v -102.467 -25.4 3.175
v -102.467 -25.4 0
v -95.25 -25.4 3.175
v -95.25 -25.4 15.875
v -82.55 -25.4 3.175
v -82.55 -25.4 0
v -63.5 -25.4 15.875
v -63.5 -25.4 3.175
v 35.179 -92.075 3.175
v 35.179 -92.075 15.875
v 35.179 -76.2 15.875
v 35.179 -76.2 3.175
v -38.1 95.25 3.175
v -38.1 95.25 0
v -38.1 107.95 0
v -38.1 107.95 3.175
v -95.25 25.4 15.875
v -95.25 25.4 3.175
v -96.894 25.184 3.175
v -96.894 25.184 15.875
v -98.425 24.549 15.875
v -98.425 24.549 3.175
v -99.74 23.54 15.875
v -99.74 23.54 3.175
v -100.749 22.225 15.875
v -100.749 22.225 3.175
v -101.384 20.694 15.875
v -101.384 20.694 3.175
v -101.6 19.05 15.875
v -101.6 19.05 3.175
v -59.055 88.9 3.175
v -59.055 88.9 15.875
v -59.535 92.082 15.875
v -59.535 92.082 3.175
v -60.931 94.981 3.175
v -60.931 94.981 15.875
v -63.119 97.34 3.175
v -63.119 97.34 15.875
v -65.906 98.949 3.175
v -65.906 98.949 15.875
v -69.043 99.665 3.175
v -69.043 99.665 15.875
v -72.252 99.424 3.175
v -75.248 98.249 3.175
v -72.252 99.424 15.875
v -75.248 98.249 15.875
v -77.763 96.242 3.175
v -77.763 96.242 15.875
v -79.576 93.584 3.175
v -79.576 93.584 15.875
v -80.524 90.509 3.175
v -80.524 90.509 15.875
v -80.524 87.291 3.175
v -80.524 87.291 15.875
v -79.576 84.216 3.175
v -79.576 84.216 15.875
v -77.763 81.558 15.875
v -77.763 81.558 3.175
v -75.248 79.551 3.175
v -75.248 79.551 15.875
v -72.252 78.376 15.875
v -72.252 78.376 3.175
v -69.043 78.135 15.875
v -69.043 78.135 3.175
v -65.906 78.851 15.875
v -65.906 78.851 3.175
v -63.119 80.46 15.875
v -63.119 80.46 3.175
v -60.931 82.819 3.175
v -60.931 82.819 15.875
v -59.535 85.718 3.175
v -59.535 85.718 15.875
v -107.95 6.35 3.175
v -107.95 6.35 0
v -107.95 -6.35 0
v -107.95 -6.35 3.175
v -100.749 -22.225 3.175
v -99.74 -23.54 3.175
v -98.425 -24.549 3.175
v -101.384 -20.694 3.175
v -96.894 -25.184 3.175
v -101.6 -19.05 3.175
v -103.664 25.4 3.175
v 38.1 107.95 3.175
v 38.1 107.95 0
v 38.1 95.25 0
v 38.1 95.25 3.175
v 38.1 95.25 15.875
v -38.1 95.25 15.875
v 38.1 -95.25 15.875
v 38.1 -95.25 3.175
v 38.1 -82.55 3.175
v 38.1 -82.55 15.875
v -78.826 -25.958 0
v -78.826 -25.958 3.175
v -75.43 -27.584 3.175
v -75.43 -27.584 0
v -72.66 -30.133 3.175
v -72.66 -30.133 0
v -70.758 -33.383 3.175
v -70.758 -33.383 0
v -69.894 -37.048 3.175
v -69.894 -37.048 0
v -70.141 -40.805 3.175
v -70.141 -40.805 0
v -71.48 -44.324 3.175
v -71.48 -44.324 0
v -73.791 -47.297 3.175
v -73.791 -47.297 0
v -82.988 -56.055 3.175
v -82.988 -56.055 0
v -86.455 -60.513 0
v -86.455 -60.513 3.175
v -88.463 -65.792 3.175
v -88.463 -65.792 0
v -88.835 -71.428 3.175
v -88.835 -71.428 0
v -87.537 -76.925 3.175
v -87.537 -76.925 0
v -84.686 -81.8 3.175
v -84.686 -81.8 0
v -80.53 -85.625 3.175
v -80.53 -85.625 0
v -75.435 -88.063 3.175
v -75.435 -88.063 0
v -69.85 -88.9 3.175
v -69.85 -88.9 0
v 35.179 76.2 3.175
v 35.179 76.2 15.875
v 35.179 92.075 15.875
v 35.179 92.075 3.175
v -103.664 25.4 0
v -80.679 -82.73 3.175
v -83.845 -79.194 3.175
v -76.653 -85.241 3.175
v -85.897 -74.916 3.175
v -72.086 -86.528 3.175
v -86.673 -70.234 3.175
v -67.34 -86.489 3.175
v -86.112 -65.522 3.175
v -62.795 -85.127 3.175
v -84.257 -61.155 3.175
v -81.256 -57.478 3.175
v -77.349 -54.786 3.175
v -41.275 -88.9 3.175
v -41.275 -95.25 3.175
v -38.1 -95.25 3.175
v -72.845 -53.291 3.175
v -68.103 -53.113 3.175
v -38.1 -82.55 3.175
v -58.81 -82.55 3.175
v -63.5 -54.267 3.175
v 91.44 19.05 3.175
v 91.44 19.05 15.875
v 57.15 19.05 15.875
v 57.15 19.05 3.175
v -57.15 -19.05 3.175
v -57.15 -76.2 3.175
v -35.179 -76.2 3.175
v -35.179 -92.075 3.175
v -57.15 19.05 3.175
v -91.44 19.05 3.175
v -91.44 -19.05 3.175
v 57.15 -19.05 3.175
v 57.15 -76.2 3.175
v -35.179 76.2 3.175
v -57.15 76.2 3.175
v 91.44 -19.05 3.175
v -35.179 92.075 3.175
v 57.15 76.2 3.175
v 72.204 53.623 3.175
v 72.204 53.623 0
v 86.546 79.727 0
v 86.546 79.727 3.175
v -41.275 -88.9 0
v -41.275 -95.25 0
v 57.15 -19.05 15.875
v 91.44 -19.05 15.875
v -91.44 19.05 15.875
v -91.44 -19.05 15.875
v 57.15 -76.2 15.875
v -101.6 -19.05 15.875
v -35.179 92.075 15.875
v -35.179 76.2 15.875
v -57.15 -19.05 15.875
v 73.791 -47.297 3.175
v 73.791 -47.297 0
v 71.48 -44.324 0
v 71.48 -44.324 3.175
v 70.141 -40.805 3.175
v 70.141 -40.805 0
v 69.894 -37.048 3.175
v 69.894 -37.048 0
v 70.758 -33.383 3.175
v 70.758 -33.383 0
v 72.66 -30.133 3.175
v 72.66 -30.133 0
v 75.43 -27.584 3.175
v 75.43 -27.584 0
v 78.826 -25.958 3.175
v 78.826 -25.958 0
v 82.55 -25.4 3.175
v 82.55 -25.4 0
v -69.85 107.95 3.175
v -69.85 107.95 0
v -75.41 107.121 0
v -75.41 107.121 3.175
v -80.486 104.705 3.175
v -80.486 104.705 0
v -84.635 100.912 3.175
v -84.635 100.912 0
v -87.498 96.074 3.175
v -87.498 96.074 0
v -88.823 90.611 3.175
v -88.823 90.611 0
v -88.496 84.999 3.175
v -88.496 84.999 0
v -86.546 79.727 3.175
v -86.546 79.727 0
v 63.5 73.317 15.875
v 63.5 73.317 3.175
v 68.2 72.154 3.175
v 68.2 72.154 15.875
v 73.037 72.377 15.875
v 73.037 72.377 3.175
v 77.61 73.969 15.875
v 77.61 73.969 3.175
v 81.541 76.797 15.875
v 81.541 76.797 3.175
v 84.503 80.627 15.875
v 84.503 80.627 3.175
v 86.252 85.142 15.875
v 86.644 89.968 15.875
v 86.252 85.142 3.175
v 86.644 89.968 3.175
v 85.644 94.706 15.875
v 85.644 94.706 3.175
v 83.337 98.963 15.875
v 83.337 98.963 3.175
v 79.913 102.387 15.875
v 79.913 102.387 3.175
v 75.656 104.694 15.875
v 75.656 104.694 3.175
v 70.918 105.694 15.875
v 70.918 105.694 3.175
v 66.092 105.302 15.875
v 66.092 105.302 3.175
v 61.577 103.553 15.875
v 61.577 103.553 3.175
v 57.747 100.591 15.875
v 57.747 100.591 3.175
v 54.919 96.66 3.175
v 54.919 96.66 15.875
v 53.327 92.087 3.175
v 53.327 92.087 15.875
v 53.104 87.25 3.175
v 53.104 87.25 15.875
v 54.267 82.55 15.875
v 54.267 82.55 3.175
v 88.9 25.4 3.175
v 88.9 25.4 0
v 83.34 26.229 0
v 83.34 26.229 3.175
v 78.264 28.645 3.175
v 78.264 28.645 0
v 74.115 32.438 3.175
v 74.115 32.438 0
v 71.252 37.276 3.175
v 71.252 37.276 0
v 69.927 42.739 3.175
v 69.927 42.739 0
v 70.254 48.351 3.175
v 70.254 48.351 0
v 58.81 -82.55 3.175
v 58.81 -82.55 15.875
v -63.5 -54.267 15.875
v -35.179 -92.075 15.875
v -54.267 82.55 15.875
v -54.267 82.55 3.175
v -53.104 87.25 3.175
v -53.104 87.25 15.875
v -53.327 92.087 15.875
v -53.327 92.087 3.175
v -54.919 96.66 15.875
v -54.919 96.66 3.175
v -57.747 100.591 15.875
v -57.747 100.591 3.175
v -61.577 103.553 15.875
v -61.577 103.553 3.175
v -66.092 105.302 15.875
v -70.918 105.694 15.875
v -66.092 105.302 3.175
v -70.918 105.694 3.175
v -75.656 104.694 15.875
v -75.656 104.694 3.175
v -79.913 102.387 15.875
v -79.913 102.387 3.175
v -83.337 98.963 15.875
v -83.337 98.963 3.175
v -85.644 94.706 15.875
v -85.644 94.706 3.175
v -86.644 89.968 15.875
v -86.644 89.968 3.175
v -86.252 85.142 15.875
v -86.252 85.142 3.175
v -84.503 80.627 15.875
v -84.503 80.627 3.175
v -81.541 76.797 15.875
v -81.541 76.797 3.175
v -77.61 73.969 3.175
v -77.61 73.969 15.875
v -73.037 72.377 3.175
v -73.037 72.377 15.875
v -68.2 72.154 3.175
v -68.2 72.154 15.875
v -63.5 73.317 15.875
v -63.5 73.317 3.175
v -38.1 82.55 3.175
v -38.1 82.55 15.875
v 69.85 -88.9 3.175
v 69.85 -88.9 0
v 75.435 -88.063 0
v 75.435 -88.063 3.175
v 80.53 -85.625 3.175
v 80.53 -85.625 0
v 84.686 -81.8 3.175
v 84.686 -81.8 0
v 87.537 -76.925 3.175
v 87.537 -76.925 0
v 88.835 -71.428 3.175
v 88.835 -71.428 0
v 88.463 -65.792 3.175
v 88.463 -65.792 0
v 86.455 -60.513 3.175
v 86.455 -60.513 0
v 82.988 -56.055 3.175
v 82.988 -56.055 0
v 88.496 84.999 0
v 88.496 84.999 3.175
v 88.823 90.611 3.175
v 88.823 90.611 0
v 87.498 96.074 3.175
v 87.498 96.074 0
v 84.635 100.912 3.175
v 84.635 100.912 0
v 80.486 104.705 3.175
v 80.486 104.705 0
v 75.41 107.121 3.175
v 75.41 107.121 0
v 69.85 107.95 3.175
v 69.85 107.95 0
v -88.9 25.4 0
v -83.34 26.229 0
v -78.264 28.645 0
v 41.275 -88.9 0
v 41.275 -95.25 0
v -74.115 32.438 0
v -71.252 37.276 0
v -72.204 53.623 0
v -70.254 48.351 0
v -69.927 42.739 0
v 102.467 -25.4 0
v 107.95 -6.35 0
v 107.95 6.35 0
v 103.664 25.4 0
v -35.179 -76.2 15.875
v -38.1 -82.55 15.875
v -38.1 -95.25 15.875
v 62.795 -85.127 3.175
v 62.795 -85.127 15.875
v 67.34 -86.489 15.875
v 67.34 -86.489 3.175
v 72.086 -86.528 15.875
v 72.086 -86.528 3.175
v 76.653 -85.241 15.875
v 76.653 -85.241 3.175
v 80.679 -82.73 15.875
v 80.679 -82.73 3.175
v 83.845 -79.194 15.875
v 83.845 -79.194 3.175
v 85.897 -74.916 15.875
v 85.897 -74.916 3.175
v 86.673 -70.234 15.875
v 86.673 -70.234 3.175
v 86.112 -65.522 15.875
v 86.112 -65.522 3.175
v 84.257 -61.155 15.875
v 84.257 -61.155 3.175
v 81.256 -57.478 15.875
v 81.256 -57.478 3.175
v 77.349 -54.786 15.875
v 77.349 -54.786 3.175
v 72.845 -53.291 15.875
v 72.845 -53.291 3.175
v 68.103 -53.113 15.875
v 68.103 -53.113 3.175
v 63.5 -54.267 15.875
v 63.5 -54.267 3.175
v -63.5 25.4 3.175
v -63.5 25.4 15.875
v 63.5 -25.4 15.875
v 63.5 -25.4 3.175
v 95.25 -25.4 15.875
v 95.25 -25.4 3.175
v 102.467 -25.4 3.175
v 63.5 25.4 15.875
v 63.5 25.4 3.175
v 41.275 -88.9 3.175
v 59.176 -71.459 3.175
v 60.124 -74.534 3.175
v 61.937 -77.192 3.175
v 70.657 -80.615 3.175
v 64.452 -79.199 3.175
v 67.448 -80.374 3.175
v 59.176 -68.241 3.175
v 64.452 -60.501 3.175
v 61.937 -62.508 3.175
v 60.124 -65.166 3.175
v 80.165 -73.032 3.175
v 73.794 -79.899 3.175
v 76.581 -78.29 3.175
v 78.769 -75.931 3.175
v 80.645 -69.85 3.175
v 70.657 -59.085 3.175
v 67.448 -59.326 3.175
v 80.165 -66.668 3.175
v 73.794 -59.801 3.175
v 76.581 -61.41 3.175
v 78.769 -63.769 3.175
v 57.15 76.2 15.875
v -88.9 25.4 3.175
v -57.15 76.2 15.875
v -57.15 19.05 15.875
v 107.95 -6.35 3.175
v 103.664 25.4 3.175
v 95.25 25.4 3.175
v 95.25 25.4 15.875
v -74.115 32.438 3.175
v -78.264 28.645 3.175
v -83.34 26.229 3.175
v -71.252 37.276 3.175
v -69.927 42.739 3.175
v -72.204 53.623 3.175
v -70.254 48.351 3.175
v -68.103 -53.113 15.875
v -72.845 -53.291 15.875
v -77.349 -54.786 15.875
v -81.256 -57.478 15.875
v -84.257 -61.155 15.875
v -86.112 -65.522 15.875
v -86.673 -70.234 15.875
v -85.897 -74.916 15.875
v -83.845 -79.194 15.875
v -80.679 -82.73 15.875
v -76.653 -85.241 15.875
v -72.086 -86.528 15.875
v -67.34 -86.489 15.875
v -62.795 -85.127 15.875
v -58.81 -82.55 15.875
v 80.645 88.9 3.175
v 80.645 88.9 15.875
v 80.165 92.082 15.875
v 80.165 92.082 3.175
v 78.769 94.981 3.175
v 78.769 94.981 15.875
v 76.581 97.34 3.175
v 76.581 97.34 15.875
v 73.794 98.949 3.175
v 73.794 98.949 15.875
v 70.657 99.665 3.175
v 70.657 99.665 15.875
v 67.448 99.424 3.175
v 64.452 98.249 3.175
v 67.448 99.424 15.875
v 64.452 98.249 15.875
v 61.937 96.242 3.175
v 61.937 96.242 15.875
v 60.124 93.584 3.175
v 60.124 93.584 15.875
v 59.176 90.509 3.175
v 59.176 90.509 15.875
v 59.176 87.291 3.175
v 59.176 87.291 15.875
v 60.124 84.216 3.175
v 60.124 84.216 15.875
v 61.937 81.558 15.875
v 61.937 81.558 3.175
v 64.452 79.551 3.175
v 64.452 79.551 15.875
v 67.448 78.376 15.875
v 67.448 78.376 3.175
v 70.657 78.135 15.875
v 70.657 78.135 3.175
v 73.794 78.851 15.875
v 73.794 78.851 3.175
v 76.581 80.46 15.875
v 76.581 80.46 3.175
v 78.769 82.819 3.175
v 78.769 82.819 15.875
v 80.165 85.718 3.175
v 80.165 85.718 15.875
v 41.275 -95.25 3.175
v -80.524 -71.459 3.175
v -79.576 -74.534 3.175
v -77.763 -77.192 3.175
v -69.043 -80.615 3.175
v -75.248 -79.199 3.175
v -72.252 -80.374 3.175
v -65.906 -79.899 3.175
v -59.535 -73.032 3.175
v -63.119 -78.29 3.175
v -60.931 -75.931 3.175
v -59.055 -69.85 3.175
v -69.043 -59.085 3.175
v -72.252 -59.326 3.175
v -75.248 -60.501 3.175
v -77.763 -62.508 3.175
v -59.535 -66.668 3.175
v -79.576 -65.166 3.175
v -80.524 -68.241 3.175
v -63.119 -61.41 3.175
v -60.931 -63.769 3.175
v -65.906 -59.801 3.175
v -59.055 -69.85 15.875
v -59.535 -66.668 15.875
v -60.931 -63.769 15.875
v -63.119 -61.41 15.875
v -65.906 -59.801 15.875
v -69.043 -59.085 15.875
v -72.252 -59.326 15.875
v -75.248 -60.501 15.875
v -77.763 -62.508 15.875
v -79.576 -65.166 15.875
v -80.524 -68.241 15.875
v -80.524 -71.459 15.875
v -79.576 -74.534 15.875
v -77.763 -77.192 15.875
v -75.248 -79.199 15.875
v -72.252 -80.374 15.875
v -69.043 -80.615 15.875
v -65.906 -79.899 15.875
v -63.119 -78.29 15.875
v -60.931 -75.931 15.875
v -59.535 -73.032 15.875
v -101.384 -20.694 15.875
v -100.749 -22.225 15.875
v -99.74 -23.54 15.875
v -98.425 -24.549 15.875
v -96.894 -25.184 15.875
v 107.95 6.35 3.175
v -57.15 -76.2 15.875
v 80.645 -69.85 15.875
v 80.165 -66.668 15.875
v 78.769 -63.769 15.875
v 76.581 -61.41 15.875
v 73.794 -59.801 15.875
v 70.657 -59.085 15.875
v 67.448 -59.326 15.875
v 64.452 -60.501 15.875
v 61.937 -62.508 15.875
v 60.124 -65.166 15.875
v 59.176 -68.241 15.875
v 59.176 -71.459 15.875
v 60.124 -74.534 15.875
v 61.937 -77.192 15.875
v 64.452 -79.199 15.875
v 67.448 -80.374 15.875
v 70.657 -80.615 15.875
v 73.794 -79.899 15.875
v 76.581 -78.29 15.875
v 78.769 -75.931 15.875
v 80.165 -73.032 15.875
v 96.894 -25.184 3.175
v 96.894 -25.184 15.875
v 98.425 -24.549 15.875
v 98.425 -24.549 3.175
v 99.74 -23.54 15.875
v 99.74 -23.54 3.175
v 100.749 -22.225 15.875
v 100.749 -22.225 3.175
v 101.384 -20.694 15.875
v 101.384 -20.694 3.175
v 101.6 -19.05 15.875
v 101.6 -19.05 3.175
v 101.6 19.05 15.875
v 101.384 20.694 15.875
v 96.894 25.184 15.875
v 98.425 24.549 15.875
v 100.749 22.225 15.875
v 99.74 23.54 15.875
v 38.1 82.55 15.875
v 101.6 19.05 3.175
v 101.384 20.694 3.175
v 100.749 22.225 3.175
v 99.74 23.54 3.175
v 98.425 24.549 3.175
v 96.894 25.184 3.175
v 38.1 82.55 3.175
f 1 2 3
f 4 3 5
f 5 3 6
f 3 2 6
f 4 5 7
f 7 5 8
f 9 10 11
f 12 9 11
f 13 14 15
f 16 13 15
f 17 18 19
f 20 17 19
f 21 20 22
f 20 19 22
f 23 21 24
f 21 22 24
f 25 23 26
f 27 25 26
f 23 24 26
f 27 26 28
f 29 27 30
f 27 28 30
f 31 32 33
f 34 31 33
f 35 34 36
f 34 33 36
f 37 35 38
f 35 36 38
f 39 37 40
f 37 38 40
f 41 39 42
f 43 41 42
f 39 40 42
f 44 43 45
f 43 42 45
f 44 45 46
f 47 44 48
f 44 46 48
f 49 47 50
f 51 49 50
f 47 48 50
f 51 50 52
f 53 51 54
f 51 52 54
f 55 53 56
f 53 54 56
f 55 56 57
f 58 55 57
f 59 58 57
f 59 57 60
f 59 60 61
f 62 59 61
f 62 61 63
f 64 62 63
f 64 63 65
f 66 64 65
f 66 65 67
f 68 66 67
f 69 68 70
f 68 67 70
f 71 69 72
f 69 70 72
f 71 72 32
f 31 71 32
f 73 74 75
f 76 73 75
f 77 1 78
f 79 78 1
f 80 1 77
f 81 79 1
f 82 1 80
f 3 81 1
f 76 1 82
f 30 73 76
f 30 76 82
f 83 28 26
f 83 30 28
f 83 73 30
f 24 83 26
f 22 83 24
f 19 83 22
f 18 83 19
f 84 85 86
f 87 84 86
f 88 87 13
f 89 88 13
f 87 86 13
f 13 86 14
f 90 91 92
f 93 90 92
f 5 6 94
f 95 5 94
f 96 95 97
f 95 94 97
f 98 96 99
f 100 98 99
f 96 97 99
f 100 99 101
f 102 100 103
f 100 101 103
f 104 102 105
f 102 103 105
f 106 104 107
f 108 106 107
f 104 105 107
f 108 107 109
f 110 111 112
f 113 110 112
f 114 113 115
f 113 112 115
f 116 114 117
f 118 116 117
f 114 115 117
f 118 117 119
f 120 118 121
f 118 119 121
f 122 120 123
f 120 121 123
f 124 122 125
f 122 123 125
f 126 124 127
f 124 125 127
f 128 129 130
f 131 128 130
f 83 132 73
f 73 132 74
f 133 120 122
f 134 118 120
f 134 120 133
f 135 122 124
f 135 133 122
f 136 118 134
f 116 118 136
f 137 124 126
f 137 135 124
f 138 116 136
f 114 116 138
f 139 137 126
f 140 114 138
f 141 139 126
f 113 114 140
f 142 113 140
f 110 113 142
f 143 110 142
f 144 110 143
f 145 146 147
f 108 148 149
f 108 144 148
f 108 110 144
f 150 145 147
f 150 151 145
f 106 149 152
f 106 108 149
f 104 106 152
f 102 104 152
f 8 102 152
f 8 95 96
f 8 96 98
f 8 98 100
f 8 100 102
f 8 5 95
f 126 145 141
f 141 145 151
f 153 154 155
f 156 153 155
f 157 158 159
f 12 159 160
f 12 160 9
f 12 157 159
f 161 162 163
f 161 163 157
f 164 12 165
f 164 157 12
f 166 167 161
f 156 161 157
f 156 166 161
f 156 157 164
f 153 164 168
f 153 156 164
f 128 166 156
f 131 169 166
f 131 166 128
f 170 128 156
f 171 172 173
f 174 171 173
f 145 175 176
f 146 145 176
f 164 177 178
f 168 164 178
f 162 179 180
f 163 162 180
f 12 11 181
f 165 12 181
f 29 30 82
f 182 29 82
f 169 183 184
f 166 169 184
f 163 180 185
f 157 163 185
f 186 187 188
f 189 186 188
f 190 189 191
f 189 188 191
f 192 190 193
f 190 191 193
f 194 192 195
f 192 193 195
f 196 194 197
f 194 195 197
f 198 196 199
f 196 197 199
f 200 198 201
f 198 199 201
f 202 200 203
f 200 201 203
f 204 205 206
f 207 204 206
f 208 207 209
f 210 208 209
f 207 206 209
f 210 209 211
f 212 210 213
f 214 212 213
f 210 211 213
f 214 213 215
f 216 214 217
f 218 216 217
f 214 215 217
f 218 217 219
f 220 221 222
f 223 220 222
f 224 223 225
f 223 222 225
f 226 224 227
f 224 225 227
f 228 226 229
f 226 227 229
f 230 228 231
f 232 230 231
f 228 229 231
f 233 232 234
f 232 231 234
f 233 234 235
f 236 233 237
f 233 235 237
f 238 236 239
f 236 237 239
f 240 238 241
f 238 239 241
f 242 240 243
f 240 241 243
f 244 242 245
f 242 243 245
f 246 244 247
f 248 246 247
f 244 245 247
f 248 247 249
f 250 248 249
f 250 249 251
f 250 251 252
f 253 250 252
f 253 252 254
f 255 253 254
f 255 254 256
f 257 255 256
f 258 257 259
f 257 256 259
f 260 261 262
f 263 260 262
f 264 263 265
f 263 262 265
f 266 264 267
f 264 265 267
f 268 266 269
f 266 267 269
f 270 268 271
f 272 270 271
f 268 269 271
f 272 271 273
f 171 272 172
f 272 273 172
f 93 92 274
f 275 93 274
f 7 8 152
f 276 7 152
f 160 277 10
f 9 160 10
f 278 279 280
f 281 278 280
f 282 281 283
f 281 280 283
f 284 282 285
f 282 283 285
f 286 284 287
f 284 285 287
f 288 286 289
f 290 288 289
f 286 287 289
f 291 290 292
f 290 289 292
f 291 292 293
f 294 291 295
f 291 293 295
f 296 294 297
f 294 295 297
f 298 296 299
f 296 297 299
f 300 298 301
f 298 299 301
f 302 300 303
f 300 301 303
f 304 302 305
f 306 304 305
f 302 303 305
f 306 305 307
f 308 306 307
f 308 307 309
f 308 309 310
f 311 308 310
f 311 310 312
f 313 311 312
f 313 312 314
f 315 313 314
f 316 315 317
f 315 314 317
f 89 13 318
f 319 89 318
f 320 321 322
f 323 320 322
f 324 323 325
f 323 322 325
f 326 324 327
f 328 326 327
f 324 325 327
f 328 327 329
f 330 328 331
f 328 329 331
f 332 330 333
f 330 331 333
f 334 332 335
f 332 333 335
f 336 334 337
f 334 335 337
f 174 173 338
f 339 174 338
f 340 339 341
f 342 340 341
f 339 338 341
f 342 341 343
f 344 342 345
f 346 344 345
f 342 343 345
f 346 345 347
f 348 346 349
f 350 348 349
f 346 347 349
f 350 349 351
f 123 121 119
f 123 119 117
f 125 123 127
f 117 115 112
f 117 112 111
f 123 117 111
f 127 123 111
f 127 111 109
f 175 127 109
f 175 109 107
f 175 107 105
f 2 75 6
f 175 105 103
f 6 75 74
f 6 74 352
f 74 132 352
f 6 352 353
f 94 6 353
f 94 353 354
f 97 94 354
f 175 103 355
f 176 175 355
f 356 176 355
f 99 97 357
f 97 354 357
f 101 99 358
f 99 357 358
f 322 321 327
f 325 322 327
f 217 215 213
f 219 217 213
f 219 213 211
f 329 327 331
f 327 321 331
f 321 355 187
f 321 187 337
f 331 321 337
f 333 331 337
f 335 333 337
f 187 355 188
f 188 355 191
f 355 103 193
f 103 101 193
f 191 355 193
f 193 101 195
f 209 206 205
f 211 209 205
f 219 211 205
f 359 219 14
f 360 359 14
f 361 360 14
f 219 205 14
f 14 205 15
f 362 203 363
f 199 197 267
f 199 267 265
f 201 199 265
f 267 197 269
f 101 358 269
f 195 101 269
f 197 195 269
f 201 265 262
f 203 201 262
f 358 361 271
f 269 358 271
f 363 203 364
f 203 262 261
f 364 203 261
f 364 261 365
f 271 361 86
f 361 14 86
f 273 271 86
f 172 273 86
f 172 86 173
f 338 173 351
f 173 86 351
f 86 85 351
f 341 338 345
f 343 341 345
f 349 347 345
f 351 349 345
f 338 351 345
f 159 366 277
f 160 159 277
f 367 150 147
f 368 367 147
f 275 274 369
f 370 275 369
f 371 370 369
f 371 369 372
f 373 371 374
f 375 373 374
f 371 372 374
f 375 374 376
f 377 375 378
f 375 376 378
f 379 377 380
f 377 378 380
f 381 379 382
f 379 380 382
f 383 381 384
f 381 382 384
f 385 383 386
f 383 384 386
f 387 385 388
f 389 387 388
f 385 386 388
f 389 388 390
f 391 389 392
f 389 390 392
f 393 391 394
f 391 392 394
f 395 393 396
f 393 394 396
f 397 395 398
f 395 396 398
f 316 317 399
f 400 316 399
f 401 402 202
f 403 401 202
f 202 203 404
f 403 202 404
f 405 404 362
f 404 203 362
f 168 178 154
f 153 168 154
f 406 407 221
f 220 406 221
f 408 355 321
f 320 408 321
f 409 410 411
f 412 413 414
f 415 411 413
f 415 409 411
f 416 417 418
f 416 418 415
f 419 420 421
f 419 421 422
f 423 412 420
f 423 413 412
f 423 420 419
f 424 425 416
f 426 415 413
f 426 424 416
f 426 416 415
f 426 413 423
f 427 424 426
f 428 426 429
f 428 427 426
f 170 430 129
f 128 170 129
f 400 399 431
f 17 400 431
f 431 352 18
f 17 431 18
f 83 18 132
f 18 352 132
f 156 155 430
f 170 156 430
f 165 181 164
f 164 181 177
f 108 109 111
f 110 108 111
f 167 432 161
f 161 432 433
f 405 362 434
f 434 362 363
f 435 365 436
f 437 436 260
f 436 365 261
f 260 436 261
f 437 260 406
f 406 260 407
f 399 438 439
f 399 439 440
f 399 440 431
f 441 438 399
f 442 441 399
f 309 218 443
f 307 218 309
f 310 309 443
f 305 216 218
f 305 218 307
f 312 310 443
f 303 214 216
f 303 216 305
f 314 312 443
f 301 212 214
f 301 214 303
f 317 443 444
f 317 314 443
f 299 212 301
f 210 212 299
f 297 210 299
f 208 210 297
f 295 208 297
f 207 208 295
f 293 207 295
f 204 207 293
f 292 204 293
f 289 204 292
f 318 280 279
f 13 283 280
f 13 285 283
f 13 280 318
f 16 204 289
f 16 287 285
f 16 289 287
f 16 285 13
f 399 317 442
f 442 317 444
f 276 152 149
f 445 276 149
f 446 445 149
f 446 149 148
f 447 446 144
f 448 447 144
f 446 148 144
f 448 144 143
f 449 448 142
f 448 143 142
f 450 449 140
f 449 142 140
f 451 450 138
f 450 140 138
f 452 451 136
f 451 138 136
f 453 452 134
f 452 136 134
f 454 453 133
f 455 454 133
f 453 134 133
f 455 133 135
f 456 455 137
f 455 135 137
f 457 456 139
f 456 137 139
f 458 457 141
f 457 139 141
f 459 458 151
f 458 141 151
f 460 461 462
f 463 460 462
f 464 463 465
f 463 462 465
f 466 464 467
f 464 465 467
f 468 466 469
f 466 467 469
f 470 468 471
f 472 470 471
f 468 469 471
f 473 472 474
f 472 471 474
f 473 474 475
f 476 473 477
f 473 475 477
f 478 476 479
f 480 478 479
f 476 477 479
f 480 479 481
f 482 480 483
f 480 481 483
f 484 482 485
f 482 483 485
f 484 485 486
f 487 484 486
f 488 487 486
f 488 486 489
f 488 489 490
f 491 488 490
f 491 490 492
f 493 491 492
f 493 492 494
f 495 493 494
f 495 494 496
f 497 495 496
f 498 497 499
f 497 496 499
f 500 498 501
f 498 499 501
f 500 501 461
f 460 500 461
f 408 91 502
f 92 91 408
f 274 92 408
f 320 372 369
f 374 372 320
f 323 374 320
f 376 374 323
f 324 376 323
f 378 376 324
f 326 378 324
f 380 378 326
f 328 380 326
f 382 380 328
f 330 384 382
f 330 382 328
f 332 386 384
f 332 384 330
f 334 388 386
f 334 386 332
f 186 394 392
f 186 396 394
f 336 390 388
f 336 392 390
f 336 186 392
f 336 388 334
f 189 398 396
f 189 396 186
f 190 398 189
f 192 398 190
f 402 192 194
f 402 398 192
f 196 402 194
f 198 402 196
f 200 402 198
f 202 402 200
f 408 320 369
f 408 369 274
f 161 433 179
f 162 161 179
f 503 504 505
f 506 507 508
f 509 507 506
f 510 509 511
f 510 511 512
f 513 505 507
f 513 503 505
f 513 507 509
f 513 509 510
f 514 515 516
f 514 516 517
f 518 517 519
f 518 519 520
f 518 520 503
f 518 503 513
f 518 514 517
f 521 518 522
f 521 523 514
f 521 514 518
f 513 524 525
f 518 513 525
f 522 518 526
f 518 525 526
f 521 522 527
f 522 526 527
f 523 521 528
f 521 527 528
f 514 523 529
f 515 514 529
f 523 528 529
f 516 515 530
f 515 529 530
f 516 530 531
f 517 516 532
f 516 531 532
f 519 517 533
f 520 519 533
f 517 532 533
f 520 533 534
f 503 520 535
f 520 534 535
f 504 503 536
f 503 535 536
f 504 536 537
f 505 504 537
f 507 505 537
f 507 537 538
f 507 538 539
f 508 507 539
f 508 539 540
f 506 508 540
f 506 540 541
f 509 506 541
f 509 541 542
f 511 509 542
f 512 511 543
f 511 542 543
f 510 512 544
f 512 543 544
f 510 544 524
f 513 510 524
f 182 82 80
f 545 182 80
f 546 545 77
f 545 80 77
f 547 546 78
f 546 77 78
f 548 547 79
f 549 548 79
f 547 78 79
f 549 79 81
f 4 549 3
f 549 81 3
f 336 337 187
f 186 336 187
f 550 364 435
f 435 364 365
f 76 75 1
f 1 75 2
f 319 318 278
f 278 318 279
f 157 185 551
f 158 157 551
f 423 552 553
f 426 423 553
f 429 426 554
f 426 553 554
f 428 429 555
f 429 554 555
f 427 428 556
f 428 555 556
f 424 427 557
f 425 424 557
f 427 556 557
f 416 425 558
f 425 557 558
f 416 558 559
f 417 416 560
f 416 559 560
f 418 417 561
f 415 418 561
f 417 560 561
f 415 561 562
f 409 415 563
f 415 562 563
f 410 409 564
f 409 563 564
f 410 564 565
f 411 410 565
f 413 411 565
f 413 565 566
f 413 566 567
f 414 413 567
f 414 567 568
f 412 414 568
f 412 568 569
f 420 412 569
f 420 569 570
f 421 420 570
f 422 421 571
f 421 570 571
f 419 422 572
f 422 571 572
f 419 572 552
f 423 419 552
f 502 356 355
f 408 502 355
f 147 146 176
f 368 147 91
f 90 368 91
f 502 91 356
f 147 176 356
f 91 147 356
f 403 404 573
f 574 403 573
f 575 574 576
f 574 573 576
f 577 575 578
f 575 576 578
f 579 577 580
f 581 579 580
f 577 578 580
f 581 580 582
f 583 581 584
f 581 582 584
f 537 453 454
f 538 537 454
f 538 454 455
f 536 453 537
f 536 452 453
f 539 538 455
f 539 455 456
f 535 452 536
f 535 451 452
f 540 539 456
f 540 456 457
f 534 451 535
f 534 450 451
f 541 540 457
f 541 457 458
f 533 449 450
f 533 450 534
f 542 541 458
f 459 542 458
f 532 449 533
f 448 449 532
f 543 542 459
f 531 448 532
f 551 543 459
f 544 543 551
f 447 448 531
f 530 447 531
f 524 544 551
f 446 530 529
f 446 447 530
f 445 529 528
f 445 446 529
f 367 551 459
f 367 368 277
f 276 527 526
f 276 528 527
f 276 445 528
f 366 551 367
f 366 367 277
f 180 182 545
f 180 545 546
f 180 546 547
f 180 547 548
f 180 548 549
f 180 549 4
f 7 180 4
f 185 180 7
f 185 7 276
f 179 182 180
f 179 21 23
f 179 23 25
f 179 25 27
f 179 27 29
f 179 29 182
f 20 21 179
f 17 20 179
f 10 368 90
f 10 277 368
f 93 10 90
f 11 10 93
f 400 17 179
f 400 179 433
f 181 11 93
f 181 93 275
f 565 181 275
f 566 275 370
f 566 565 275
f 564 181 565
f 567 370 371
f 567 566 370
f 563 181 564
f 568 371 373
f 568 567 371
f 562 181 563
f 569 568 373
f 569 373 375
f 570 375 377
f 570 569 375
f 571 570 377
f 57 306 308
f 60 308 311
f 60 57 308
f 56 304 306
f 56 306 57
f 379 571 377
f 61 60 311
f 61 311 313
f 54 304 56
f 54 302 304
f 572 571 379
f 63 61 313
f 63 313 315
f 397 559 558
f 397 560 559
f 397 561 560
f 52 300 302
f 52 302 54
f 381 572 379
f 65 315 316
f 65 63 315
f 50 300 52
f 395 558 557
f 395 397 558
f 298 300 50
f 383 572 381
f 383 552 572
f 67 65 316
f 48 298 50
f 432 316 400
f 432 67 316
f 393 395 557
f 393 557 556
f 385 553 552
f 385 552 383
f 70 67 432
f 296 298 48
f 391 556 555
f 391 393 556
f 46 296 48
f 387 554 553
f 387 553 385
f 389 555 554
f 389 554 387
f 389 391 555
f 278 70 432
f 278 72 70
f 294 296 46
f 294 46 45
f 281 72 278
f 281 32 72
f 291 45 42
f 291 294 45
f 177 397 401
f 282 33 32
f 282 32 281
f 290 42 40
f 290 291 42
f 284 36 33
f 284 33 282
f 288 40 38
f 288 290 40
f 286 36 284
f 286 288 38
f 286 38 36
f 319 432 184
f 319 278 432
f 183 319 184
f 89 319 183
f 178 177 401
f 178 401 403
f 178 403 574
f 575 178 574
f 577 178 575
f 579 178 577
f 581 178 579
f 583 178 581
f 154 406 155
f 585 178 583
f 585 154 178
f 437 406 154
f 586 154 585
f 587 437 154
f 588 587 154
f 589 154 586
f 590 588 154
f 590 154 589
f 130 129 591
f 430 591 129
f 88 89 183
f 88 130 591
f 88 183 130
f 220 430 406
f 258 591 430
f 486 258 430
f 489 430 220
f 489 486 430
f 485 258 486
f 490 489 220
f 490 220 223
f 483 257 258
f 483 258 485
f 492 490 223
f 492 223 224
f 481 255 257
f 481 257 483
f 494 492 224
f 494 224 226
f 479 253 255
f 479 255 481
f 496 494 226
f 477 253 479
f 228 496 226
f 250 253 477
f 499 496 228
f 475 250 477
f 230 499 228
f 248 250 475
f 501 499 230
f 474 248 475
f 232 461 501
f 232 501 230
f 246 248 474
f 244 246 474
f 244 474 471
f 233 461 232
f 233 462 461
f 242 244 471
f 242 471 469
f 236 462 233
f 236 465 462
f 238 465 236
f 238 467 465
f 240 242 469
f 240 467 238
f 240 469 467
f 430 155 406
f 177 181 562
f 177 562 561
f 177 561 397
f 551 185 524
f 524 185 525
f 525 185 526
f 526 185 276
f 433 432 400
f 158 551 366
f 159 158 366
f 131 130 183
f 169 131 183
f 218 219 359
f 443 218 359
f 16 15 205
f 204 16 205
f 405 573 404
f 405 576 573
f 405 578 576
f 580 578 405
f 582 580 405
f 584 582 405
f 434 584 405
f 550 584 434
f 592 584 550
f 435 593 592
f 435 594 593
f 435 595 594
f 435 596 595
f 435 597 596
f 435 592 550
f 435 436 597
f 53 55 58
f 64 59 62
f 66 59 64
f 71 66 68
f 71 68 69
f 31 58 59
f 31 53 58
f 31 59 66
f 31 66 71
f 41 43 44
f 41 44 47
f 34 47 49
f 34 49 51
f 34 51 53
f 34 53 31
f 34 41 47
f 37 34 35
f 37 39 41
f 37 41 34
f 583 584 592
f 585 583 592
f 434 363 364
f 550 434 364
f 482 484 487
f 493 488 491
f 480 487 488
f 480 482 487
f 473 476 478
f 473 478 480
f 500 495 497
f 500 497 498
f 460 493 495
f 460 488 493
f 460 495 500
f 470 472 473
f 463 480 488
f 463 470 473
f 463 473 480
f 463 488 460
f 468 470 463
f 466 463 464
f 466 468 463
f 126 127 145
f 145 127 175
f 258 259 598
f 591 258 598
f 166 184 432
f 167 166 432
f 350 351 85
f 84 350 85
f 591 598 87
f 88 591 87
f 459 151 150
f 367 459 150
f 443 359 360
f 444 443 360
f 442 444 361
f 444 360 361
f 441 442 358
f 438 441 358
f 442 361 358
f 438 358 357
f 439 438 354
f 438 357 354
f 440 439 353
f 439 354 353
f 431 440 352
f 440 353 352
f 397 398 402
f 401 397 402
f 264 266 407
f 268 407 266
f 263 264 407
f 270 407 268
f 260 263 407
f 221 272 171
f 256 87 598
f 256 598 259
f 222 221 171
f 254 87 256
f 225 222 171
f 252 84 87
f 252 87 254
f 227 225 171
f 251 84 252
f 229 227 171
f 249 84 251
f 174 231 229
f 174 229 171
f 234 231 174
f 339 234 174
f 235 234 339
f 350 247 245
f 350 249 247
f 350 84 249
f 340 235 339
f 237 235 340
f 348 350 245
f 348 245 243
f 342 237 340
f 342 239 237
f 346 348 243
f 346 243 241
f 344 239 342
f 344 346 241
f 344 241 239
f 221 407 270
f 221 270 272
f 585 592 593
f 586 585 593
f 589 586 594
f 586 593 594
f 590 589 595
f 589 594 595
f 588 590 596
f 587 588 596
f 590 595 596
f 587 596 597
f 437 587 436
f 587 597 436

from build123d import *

# Parameters (mm, degrees)
F1_DEPTH = 3.175
F3_DEPTH = 12.7
F5_DEPTH = 12.7
F6_R     = 10.795
F7_DEPTH = 12.7


with BuildPart() as f1:
    # F0 (on Top) → F1 (new body)
    with BuildSketch(Plane.XY):
        with BuildLine():
            Line((72.204018, 53.623151), (86.545982, 79.726849))
            ThreePointArc((86.545982, 79.726849), (86.245899, 98.599329), (69.85, 107.95))
            Line((69.85, 107.95), (38.1, 107.95))
            Line((38.1, 107.95), (38.1, 95.25))
            Line((38.1, 95.25), (-38.1, 95.25))
            Line((-38.1, 95.25), (-38.1, 107.95))
            Line((-38.1, 107.95), (-69.85, 107.95))
            ThreePointArc((-69.85, 107.95), (-86.245899, 98.599329), (-86.545982, 79.726849))
            Line((-86.545982, 79.726849), (-72.204018, 53.623151))
            ThreePointArc((-72.204018, 53.623151), (-72.504101, 34.750671), (-88.9, 25.4))
            Line((-88.9, 25.4), (-103.66375, 25.4))
            Line((-103.66375, 25.4), (-107.95, 6.35))
            Line((-107.95, 6.35), (-107.95, -6.35))
            Line((-107.95, -6.35), (-102.467009, -25.4))
            Line((-102.467009, -25.4), (-82.55, -25.4))
            ThreePointArc((-82.55, -25.4), (-70.758346, -33.383338), (-73.791379, -47.296552))
            Line((-73.791379, -47.296552), (-82.987931, -56.055172))
            ThreePointArc((-82.987931, -56.055172), (-87.537481, -76.924992), (-69.85, -88.9))
            Line((-69.85, -88.9), (-41.275, -88.9))
            Line((-41.275, -88.9), (-41.275, -95.25))
            Line((-41.275, -95.25), (41.275, -95.25))
            Line((41.275, -95.25), (41.275, -88.9))
            Line((41.275, -88.9), (69.85, -88.9))
            ThreePointArc((69.85, -88.9), (87.537481, -76.924992), (82.987931, -56.055172))
            Line((82.987931, -56.055172), (73.791379, -47.296552))
            ThreePointArc((73.791379, -47.296552), (70.758346, -33.383338), (82.55, -25.4))
            Line((82.55, -25.4), (102.467009, -25.4))
            Line((102.467009, -25.4), (107.95, -6.35))
            Line((107.95, -6.35), (107.95, 6.35))
            Line((107.95, 6.35), (103.66375, 25.4))
            Line((103.66375, 25.4), (88.9, 25.4))
            ThreePointArc((88.9, 25.4), (72.504101, 34.750671), (72.204018, 53.623151))
        make_face()
    extrude(amount=F1_DEPTH)

    # F2 (on face) → F3 (join)
    with BuildSketch(Plane.XY.offset(3.175)):
        with BuildLine():
            Line((-38.1, 82.55), (-54.266603, 82.55))
            ThreePointArc((-54.266603, 82.55), (-81.748839, 100.798839), (-63.5, 73.316603))
            Line((-63.5, 73.316603), (-63.5, 25.4))
            Line((-63.5, 25.4), (-88.9, 25.4))
            Line((-88.9, 25.4), (-95.25, 25.4))
            ThreePointArc((-95.25, 25.4), (-99.740128, 23.540128), (-101.6, 19.05))
            Line((-101.6, 19.05), (-101.6, -19.05))
            ThreePointArc((-101.6, -19.05), (-99.740128, -23.540128), (-95.25, -25.4))
            Line((-95.25, -25.4), (-82.55, -25.4))
            Line((-82.55, -25.4), (-63.5, -25.4))
            Line((-63.5, -25.4), (-63.5, -54.266603))
            ThreePointArc((-63.5, -54.266603), (-86.450842, -72.602597), (-58.81031, -82.55))
            Line((-58.81031, -82.55), (-38.1, -82.55))
            Line((-38.1, -82.55), (-38.1, -95.25))
            Line((-38.1, -95.25), (38.1, -95.25))
            Line((38.1, -95.25), (38.1, -82.55))
            Line((38.1, -82.55), (58.81031, -82.55))
            ThreePointArc((58.81031, -82.55), (86.450842, -72.602597), (63.5, -54.266603))
            Line((63.5, -54.266603), (63.5, -25.4))
            Line((63.5, -25.4), (82.55, -25.4))
            Line((82.55, -25.4), (95.25, -25.4))
            ThreePointArc((95.25, -25.4), (99.740128, -23.540128), (101.6, -19.05))
            Line((101.6, -19.05), (101.6, 19.05))
            ThreePointArc((101.6, 19.05), (99.740128, 23.540128), (95.25, 25.4))
            Line((95.25, 25.4), (88.9, 25.4))
            Line((88.9, 25.4), (63.5, 25.4))
            Line((63.5, 25.4), (63.5, 73.316603))
            ThreePointArc((63.5, 73.316603), (81.748839, 100.798839), (54.266603, 82.55))
            Line((54.266603, 82.55), (38.1, 82.55))
            Line((38.1, 82.55), (38.1, 95.25))
            Line((38.1, 95.25), (-38.1, 95.25))
            Line((-38.1, 95.25), (-38.1, 82.55))
        make_face()
    extrude(amount=F3_DEPTH)

    # F4 (on face) → F5 (cut)
    with BuildSketch(Plane.XY.offset(15.875)):
        Polygon((-35.179, 76.2), (-57.15, 76.2), (-57.15, 19.05), (-91.44, 19.05), (-91.44, -19.05), (-57.15, -19.05), (-57.15, -76.2), (-35.179, -76.2), (-35.179, -92.075), (35.179, -92.075), (35.179, -76.2), (57.15, -76.2), (57.15, -19.05), (91.44, -19.05), (91.44, 19.05), (57.15, 19.05), (57.15, 76.2), (35.179, 76.2), (35.179, 92.075), (-35.179, 92.075), align=None)
    extrude(amount=-F5_DEPTH, mode=Mode.SUBTRACT)

    # F6 (on face) → F7 (cut)
    with BuildSketch(Plane.XY.offset(15.875)):
        with Locations((-69.85, -69.85)):
            Circle(F6_R)
        with Locations((-69.85, 88.9)):
            Circle(F6_R)
        with Locations((69.85, 88.9)):
            Circle(F6_R)
        with Locations((69.85, -69.85)):
            Circle(F6_R)
    extrude(amount=-F7_DEPTH, mode=Mode.SUBTRACT)


solid = f1.part
